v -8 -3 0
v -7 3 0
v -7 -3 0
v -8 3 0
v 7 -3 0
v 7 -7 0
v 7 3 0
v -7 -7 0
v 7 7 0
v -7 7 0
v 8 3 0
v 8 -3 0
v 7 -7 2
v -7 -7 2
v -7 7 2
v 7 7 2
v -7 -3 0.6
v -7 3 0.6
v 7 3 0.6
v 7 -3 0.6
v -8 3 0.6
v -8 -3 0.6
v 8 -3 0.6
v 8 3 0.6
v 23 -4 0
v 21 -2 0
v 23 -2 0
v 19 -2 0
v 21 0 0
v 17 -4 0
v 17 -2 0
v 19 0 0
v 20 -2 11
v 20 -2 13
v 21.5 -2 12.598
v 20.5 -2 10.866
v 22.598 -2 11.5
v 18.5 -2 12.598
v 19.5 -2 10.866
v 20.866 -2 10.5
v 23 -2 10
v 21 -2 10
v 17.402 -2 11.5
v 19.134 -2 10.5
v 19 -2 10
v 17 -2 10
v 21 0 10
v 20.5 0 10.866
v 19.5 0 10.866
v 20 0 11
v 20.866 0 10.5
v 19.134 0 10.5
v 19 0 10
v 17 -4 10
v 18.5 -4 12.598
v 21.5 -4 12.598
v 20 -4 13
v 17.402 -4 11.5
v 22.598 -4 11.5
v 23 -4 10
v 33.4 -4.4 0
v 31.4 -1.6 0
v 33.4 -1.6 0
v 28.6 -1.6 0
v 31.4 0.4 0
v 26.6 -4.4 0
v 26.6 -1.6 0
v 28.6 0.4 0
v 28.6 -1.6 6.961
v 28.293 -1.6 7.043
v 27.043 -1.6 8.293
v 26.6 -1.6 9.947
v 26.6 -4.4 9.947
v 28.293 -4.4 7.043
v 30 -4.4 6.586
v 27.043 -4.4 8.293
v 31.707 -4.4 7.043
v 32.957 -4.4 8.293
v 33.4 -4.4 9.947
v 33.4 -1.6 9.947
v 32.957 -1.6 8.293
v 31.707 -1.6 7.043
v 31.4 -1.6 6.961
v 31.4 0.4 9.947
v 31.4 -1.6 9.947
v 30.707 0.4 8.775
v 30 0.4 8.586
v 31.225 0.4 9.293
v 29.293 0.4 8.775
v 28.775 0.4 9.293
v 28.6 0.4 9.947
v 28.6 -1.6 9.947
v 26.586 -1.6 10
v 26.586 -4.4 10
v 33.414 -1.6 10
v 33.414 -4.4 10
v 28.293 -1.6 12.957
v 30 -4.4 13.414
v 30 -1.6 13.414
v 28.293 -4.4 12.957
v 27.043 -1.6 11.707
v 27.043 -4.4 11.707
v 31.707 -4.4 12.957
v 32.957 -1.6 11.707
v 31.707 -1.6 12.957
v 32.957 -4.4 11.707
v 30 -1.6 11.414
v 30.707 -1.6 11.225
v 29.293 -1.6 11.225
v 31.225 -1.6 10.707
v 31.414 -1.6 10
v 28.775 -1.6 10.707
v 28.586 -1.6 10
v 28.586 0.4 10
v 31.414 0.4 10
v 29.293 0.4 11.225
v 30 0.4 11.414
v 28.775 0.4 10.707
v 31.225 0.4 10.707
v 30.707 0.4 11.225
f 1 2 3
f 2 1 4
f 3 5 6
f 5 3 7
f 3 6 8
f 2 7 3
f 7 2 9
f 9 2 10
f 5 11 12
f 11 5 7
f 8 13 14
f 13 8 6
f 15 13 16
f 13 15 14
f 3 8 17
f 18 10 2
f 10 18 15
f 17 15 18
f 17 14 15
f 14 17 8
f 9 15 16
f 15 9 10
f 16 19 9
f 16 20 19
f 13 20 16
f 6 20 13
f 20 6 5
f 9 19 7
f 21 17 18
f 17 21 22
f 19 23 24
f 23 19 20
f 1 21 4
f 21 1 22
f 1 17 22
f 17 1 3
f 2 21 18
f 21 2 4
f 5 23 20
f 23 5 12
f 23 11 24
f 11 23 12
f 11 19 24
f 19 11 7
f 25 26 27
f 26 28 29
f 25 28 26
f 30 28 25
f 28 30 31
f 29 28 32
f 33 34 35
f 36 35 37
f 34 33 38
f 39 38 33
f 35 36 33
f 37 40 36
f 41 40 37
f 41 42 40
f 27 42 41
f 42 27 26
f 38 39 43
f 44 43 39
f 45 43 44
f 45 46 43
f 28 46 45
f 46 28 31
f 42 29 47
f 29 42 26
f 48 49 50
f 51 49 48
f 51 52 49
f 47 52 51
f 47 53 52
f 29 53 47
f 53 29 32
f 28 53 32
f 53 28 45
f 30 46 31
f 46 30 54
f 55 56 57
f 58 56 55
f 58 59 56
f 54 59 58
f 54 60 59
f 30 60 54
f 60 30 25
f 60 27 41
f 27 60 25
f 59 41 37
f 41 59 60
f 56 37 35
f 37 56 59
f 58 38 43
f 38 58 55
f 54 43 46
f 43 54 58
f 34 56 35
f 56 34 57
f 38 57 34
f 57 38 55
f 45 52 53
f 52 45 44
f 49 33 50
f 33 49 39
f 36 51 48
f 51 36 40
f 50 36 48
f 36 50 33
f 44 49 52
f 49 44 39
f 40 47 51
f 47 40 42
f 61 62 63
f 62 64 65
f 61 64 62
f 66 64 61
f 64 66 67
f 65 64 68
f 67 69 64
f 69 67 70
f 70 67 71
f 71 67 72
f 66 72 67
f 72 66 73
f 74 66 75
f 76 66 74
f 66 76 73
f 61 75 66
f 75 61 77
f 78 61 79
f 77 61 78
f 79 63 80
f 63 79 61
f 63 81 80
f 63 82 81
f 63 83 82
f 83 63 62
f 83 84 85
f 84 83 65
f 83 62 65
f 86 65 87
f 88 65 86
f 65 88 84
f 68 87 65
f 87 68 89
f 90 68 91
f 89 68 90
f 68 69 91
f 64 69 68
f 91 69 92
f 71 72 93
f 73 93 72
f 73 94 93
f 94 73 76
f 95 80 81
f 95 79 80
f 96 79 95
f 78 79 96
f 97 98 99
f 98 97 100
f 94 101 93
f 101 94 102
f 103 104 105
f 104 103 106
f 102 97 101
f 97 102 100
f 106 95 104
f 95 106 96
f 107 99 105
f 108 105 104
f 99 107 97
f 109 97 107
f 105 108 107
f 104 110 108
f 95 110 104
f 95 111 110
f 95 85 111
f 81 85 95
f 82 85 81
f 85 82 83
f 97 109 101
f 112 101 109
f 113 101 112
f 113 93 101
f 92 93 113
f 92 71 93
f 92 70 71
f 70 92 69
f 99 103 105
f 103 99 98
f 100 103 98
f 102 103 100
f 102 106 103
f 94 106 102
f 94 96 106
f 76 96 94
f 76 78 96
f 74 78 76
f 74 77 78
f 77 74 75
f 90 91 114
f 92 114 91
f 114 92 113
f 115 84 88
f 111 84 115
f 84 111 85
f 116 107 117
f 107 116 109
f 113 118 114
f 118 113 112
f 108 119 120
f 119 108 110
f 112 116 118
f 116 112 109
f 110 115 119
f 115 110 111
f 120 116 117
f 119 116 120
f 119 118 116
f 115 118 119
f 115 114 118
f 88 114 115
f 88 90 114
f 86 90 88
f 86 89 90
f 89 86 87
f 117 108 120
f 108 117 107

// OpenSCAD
module keyswitch_hole(x=0, y=0, a=0) {
    translate([x, y, 0]) {
        rotate([0, 0, 90+a]) {
            linear_extrude(height = 2) {
            square([14, 14], center = true);
            //translate([-8, 3, 0]) square([1, 3]);
            //translate([-8, -6, 0]) square([1, 3]);
            //translate([7, 3, 0]) square([1, 3]);
            //translate([7, -6, 0]) square([1, 3]);
            }
            linear_extrude(height = 0.6) {
                translate([-3, 7]) square([6, 1]);
            translate([-3, -8]) square([6, 1]);
            }
        }
    }
}

keyswitch_hole();

module joint_male_face() {
    translate([-1, 0])
    square([2,4]);
    translate([-3, 2])
    square([6,2]);
}

module joint_male(pos=[0,0]) {
    translate(pos){
      rotate([0,0,180]){
        linear_extrude(height=10)
        joint_male_face();
        
        translate([0,2,10])
        rotate([-90,0,0])
        linear_extrude(height=2)
        circle(3, $fn=12);
        
        translate([0,0,10])
        rotate([-90,0,0])
        linear_extrude(height=2)
        circle(1, $fn=12);
      }
    }
}

module joint_female(pos=[0,0]) {
    translate(pos){
      rotate([0,0,180]){
        linear_extrude(height=10)
        offset(delta=0.4)
        joint_male_face();
        
        translate([0,1.6,10])
        rotate([-90,0,0])
        linear_extrude(height=2.8)
        offset(delta=0.4)
        circle(3, $fn=12);

        translate([0,-0.4,10])
        rotate([-90,0,0])
        linear_extrude(height=2.8)
        offset(delta=0.4)
        circle(1, $fn=12);
      }
    }
}


joint_male([20, 0]);
joint_female([30, 0]);
